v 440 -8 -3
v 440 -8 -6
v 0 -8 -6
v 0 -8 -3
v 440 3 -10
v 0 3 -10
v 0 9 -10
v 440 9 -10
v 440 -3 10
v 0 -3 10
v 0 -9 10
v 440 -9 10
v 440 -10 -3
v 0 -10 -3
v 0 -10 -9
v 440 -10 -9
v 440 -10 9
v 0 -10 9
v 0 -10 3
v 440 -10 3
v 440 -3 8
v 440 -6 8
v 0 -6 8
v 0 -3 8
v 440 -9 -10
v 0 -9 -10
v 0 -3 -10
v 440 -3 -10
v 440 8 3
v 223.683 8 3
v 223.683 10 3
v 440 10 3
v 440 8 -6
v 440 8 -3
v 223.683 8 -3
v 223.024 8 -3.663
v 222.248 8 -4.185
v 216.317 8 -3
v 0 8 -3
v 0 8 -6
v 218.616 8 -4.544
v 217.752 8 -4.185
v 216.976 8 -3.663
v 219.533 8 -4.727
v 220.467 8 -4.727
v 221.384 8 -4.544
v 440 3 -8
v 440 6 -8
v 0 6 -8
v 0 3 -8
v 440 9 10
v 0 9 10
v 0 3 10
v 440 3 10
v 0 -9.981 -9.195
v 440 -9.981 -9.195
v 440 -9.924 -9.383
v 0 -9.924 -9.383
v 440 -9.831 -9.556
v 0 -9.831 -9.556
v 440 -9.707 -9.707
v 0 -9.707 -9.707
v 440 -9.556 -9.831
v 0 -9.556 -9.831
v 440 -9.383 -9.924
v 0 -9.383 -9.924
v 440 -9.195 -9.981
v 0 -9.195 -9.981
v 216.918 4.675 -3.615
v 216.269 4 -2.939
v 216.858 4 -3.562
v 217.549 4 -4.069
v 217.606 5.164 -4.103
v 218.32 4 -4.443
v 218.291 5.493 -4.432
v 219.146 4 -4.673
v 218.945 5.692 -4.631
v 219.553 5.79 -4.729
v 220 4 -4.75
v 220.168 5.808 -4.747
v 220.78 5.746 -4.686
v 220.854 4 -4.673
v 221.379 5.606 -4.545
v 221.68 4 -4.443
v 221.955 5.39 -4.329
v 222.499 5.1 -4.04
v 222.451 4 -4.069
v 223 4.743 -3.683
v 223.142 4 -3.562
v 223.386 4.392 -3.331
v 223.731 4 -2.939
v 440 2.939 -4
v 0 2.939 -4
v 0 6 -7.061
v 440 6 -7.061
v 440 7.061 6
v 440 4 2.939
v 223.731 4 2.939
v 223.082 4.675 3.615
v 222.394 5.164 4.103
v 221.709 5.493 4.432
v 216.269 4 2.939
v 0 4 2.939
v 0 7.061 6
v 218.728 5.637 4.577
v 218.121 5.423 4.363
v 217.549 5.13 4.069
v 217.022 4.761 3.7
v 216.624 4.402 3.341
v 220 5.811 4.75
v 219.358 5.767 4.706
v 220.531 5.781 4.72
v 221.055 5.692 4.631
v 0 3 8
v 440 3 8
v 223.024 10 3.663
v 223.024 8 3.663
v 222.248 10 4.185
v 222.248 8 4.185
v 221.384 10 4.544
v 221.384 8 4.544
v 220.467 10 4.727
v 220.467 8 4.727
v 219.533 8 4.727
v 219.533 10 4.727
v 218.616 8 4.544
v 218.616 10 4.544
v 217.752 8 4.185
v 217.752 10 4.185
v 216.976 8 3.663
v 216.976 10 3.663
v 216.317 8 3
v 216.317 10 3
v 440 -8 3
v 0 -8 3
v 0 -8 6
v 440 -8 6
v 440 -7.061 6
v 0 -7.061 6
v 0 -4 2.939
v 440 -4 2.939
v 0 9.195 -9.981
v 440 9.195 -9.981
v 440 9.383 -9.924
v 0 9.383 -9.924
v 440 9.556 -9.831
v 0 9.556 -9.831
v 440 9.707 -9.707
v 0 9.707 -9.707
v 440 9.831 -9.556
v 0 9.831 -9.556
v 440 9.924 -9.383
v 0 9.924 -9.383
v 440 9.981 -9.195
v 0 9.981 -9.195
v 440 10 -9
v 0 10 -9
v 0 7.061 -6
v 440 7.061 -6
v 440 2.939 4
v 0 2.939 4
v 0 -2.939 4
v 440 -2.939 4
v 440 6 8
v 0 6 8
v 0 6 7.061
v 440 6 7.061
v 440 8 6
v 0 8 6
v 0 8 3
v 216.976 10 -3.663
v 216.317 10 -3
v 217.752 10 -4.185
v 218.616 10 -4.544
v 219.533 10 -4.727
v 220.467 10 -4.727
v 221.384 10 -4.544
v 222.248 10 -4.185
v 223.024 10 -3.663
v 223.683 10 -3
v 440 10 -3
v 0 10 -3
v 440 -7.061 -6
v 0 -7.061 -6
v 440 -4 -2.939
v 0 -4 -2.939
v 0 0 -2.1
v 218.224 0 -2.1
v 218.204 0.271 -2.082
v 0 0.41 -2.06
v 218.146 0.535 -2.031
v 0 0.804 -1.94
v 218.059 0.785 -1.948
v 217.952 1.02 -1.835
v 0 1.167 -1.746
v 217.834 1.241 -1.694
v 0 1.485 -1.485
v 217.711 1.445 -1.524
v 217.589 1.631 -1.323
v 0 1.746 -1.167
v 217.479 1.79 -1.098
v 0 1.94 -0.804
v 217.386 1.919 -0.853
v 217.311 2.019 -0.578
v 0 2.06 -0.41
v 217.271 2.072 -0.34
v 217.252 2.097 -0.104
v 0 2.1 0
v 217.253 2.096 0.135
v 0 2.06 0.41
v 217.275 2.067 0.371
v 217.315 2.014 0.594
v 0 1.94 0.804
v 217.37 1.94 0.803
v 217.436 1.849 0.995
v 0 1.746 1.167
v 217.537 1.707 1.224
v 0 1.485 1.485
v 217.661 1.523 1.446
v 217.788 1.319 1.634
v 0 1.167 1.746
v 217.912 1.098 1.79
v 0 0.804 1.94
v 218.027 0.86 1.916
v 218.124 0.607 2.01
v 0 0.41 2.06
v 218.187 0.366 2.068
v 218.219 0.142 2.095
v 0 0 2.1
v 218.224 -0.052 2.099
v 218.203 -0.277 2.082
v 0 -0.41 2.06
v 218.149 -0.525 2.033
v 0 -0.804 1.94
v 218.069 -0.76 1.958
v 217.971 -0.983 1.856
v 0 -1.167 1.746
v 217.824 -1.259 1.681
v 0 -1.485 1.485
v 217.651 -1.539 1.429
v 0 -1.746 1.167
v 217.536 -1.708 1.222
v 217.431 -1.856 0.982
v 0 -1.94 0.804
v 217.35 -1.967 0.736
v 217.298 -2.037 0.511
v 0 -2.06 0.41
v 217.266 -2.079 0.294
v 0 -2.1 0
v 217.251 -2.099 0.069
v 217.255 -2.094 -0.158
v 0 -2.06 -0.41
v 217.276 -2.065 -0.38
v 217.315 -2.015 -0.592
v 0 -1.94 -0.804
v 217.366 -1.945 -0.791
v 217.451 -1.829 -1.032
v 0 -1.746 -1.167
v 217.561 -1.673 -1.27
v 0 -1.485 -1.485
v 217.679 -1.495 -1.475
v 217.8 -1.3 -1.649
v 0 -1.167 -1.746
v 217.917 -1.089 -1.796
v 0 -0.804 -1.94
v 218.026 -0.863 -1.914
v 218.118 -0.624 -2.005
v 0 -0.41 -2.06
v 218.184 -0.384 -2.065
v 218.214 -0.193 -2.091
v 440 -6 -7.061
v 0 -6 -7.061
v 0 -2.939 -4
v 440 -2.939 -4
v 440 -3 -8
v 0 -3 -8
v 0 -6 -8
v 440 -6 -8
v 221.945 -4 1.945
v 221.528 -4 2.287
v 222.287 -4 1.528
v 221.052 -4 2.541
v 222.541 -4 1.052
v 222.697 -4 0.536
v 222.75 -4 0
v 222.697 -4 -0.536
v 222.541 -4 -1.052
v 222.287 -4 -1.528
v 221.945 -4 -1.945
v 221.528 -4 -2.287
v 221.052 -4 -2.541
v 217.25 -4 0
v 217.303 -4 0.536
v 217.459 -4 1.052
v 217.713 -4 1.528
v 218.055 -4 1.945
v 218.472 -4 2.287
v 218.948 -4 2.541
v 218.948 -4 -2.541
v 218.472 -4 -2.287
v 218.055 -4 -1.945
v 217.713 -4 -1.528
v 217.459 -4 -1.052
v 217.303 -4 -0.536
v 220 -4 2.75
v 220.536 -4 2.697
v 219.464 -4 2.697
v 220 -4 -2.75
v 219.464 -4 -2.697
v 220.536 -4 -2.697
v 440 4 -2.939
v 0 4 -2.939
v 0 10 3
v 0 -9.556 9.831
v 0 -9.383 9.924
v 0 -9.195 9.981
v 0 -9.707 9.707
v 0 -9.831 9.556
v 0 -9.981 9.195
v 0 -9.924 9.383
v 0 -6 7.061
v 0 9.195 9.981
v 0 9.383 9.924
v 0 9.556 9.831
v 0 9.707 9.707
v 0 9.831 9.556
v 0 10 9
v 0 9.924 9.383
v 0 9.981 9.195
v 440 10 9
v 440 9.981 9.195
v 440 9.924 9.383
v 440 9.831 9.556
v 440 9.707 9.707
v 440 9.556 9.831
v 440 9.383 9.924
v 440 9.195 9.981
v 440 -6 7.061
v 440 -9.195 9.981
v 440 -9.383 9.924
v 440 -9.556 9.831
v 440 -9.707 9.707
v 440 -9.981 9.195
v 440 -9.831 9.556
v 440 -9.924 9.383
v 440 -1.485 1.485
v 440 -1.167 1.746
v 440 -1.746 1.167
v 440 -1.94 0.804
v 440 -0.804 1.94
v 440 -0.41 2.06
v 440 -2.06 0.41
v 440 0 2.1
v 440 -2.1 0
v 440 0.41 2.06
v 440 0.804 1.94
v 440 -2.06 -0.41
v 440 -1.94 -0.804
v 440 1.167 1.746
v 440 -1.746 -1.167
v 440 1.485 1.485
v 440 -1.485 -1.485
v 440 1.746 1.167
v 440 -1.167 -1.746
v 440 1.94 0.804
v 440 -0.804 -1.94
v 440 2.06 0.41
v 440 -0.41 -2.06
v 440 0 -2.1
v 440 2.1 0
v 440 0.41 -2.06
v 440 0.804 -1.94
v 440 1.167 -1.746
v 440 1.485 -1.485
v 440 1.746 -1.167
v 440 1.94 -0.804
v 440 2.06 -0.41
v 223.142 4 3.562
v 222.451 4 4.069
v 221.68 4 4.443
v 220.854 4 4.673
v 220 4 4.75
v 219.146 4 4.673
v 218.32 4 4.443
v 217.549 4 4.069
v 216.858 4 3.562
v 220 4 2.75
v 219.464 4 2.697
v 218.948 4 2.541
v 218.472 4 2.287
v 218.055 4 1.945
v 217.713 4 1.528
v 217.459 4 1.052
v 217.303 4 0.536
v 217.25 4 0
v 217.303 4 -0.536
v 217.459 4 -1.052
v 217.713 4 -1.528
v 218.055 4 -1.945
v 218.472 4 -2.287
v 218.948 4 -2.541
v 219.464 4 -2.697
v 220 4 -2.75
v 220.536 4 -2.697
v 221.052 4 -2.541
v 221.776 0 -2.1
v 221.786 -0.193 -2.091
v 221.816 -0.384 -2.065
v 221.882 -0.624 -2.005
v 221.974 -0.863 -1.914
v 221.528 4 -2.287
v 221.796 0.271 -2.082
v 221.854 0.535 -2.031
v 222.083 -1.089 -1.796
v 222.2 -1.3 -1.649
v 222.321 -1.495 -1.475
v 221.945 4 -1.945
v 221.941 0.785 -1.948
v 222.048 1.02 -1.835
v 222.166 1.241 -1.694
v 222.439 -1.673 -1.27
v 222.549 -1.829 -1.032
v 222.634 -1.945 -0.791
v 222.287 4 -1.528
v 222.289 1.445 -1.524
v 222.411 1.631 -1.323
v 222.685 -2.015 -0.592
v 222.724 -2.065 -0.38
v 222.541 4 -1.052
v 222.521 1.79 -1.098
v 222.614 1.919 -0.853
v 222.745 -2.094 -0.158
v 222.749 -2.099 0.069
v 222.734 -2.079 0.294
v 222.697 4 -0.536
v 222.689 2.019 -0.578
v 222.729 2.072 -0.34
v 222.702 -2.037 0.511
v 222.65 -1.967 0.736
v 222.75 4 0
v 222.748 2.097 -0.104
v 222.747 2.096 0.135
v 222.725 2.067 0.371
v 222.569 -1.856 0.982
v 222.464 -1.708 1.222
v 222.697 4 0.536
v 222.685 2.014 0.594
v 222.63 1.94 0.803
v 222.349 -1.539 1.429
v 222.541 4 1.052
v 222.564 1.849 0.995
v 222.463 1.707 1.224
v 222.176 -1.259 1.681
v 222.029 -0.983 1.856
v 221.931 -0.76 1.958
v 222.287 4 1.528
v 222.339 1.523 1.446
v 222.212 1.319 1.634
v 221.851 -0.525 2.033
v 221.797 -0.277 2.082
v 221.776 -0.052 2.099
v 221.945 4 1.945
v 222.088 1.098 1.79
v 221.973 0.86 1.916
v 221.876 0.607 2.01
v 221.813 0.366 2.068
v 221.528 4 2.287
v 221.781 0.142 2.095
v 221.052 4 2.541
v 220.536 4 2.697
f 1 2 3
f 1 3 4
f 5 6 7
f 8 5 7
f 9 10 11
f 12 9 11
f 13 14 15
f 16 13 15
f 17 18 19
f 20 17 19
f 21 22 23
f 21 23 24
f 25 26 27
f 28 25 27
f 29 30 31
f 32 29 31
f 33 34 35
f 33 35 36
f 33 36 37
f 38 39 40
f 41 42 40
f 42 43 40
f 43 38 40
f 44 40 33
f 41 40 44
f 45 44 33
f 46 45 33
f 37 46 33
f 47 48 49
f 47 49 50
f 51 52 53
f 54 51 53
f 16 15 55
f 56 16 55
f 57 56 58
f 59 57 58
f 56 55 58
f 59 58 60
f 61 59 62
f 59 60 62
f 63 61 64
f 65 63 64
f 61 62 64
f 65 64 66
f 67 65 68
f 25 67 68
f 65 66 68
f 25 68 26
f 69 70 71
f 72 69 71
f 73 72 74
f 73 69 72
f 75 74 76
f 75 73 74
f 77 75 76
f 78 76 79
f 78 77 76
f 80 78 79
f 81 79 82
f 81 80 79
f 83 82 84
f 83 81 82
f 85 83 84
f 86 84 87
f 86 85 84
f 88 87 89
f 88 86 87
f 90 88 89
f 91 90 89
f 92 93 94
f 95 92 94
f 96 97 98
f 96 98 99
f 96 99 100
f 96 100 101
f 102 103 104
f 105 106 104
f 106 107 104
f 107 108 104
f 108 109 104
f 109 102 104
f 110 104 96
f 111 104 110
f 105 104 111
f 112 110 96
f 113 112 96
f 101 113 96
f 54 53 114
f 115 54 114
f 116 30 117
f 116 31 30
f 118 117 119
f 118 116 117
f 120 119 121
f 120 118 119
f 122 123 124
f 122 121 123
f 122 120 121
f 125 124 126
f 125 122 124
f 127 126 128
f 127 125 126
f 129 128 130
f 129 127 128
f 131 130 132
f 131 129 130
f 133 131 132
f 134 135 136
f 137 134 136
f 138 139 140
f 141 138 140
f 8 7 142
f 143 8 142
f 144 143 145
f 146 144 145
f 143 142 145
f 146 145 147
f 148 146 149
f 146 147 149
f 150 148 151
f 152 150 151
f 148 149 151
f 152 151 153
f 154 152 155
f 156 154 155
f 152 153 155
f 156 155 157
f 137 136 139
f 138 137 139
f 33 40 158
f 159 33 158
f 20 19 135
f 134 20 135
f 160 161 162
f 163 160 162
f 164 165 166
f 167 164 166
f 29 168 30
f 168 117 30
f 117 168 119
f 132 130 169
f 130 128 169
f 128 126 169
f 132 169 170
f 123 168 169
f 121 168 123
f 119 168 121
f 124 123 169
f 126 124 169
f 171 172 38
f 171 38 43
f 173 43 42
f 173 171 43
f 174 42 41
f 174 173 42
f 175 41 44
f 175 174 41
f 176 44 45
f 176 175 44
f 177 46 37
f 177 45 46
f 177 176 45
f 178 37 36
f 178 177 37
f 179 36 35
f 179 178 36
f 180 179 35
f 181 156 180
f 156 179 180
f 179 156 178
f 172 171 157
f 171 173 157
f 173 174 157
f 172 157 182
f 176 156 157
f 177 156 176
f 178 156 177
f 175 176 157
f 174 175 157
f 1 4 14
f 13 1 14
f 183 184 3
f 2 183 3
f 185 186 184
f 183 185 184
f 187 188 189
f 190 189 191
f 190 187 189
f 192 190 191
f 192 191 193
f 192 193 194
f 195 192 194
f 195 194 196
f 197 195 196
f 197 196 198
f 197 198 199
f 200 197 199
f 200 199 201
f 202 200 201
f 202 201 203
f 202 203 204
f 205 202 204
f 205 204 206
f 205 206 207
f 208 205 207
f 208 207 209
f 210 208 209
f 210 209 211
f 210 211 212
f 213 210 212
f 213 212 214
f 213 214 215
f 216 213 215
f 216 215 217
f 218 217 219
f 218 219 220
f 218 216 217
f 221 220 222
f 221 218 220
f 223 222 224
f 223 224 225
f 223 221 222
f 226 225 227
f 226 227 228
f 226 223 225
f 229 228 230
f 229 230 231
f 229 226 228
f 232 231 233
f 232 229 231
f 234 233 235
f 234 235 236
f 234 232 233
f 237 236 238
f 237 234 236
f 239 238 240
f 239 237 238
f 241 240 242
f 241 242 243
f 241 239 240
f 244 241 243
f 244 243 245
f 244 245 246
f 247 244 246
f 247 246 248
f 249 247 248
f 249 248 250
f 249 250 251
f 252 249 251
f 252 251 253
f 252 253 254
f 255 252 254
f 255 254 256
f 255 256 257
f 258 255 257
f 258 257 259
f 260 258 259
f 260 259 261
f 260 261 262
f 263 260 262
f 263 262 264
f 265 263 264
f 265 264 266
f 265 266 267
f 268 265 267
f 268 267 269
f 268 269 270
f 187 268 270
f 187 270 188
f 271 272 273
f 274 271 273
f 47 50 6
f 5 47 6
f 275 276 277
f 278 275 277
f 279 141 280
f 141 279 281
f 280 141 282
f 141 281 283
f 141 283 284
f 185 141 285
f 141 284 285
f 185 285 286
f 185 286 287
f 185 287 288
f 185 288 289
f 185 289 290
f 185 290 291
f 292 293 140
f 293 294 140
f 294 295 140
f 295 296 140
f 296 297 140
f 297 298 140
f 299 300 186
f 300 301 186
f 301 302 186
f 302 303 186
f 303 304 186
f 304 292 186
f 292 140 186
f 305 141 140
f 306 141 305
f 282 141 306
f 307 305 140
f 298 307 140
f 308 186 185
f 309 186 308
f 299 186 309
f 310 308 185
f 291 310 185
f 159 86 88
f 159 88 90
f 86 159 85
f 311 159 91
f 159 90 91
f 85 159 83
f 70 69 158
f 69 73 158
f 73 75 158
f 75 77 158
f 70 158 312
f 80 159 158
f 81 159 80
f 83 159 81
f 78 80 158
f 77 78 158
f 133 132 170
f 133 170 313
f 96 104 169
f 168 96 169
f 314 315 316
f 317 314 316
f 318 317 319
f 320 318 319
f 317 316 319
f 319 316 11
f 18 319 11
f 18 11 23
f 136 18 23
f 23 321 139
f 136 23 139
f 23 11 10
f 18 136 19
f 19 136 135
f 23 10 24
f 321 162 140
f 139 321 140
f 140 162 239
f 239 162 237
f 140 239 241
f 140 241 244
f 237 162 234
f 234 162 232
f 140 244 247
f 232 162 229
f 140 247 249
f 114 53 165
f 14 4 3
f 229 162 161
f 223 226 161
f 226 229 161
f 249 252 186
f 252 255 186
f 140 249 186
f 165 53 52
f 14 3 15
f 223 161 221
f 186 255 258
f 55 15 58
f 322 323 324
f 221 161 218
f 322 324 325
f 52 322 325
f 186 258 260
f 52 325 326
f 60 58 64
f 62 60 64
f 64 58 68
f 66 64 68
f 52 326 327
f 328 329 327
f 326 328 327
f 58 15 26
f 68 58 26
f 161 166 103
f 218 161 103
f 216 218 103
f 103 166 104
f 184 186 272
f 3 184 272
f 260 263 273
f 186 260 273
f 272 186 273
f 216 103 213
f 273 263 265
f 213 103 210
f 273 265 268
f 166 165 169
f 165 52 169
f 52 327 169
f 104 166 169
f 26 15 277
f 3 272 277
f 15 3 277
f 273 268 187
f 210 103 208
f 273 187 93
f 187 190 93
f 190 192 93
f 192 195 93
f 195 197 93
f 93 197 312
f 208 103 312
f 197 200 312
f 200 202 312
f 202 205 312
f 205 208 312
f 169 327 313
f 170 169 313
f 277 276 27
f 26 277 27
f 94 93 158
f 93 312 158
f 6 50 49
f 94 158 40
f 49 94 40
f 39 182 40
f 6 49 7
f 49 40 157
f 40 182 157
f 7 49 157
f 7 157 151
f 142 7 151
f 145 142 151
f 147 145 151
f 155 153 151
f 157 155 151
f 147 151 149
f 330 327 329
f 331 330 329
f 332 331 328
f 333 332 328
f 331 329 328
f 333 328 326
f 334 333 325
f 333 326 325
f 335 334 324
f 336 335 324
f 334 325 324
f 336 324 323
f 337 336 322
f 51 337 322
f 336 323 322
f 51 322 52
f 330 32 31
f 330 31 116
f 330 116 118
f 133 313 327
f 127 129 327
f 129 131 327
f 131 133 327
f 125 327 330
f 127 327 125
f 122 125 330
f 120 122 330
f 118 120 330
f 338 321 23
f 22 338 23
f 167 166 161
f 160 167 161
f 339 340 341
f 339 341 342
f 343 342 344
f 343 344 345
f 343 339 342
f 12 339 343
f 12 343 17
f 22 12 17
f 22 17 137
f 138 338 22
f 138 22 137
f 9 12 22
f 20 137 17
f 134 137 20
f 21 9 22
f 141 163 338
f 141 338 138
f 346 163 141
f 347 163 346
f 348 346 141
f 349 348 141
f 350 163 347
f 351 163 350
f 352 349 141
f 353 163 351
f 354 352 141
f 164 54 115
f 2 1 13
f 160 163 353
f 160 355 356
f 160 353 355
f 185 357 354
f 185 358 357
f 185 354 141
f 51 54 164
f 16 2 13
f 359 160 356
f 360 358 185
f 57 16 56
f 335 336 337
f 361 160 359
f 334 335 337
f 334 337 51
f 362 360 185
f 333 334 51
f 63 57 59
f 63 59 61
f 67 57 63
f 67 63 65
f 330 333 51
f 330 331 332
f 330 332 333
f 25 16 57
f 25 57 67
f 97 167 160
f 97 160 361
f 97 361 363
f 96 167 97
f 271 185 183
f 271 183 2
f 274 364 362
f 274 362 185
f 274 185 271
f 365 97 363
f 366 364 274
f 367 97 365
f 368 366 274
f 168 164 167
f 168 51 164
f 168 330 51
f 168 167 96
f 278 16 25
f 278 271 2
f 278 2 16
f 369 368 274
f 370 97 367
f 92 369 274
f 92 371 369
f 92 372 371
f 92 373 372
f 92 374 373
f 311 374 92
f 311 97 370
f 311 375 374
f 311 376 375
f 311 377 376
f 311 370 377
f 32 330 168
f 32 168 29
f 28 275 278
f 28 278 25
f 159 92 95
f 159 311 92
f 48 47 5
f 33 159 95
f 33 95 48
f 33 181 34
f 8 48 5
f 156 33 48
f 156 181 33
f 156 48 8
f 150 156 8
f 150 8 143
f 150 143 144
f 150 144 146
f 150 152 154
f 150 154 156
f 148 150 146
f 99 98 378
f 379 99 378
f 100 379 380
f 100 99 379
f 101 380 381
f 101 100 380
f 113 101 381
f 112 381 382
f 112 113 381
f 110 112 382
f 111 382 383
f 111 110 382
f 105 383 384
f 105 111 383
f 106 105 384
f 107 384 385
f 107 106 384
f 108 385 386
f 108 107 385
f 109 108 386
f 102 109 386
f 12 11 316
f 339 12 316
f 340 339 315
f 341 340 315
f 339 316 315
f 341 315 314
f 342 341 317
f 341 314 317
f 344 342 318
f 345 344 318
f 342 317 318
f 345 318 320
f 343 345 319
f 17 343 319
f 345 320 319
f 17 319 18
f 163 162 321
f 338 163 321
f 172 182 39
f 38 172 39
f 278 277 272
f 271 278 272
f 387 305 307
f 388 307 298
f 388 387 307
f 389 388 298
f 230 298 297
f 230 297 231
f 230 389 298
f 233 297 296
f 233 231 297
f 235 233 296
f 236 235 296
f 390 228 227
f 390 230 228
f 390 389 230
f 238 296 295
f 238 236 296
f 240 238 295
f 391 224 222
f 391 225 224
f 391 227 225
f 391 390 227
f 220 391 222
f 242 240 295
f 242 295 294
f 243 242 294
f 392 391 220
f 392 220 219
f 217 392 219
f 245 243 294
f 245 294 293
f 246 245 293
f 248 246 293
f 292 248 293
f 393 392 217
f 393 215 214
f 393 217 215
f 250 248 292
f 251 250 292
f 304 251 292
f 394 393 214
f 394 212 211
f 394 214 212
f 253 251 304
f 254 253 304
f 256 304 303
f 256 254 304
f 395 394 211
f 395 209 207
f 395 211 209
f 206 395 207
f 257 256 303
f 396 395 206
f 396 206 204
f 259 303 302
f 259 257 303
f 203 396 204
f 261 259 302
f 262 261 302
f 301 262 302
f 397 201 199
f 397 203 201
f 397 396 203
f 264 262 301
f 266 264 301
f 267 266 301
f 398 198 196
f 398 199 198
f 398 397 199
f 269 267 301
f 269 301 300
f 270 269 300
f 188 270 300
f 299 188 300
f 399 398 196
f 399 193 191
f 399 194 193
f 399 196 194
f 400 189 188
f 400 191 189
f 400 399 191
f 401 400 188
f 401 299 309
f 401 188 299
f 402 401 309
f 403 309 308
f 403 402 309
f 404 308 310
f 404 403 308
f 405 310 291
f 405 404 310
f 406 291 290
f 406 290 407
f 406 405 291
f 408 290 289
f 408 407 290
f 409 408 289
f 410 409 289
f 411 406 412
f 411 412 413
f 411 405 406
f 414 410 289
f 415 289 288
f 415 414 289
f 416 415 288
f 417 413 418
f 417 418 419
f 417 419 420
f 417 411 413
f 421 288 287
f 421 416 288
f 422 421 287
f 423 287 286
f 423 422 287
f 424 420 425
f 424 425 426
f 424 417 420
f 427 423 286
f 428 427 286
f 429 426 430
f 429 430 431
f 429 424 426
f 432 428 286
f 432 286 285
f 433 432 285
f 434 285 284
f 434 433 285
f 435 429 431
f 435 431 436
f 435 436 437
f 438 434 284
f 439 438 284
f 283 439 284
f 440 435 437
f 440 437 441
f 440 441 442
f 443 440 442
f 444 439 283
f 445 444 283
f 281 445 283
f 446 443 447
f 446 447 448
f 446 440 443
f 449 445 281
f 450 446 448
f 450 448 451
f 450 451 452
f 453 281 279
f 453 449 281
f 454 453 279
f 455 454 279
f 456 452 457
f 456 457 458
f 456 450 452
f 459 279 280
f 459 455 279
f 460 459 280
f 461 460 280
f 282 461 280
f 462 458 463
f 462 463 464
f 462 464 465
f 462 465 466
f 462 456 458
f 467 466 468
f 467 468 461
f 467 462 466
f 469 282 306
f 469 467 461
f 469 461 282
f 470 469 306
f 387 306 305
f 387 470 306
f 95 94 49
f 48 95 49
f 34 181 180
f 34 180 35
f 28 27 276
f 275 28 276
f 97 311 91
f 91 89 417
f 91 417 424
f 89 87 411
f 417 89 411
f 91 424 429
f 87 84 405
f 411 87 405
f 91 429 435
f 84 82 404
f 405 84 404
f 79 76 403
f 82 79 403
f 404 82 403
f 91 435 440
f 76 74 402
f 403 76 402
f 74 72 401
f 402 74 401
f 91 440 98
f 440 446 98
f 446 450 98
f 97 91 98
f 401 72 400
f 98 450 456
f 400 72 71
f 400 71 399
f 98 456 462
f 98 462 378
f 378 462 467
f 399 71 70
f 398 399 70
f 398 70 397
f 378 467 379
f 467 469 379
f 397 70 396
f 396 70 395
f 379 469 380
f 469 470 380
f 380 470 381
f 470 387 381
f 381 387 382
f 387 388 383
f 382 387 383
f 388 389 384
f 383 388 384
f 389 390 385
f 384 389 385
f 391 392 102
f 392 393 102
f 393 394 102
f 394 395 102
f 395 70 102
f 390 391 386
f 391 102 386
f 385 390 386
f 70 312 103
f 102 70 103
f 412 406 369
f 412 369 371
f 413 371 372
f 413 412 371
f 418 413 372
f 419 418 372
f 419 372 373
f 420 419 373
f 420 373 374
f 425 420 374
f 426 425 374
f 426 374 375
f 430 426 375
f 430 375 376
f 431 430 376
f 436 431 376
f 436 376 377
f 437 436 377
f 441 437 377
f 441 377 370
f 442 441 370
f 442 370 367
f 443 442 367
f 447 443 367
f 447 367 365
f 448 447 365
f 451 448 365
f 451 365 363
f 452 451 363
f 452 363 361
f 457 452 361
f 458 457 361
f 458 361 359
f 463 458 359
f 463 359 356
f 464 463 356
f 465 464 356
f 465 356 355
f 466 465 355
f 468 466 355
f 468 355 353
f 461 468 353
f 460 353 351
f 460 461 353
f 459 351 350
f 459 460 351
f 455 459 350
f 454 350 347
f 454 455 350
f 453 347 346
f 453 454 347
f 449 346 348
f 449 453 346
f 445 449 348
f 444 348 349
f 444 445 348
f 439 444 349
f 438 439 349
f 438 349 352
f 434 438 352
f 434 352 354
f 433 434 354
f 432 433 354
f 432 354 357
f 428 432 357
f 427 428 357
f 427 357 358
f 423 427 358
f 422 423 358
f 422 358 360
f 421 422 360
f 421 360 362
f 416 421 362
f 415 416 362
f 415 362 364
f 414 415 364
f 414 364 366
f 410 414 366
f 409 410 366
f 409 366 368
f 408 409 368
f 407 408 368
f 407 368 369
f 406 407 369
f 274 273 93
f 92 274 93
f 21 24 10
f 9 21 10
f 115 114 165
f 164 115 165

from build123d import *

# Parameters (mm, degrees)
SKETCH1_R           = 2.1
BOSS_EXTRUDE1_DEPTH = 440


with BuildPart() as part:
    # Sketch1 → Boss-Extrude1 (new body)
    with BuildSketch(Plane(origin=(0, 0, 0), x_dir=(0, 0, -1), z_dir=(1, 0, 0))):
        with BuildLine():
            Line((-10, 9), (-10, 3))
            Line((-10, 3), (-8, 3))
            Line((-8, 3), (-8, 6))
            Line((-8, 6), (-7.060660172, 6))
            Line((-7.060660172, 6), (-4, 2.939339828))
            Line((-4, 2.939339828), (-4, -2.939339828))
            Line((-4, -2.939339828), (-7.060660172, -6))
            Line((-7.060660172, -6), (-8, -6))
            Line((-8, -6), (-8, -3))
            Line((-8, -3), (-10, -3))
            Line((-10, -3), (-10, -9))
            ThreePointArc((-10, -9), (-9.707106781, -9.707106781), (-9, -10))
            Line((-9, -10), (-3, -10))
            Line((-3, -10), (-3, -8))
            Line((-3, -8), (-6, -8))
            Line((-6, -8), (-6, -7.060660172))
            Line((-6, -7.060660172), (-2.939339828, -4))
            Line((-2.939339828, -4), (2.939339828, -4))
            Line((2.939339828, -4), (6, -7.060660172))
            Line((6, -7.060660172), (6, -8))
            Line((6, -8), (3, -8))
            Line((3, -8), (3, -10))
            Line((3, -10), (9, -10))
            ThreePointArc((9, -10), (9.707106781, -9.707106781), (10, -9))
            Line((10, -9), (10, -3))
            Line((10, -3), (8, -3))
            Line((8, -3), (8, -6))
            Line((8, -6), (7.060660172, -6))
            Line((7.060660172, -6), (4, -2.939339828))
            Line((4, -2.939339828), (4, 2.939339828))
            Line((4, 2.939339828), (7.060660172, 6))
            Line((7.060660172, 6), (8, 6))
            Line((8, 6), (8, 3))
            Line((8, 3), (10, 3))
            Line((10, 3), (10, 9))
            ThreePointArc((10, 9), (9.707106781, 9.707106781), (9, 10))
            Line((9, 10), (3, 10))
            Line((3, 10), (3, 8))
            Line((3, 8), (6, 8))
            Line((6, 8), (6, 7.060660172))
            Line((6, 7.060660172), (2.939339828, 4))
            Line((2.939339828, 4), (-2.939339828, 4))
            Line((-2.939339828, 4), (-6, 7.060660172))
            Line((-6, 7.060660172), (-6, 8))
            Line((-6, 8), (-3, 8))
            Line((-3, 8), (-3, 10))
            Line((-3, 10), (-9, 10))
            ThreePointArc((-9, 10), (-9.707106781, 9.707106781), (-10, 9))
        make_face()
        Circle(SKETCH1_R, mode=Mode.SUBTRACT)
    extrude(amount=BOSS_EXTRUDE1_DEPTH)

    # Sketch80 → Cut-Revolve1 (revolve, cut)
    with BuildSketch(Plane.XY):
        Polygon((220, -10), (222.75, -10), (222.75, 4), (224.75, 4), (224.75, 10), (220, 10), align=None)
    revolve(axis=Axis((220, 10, 0), (0, -1, 0)), mode=Mode.SUBTRACT)


solid = part.part
